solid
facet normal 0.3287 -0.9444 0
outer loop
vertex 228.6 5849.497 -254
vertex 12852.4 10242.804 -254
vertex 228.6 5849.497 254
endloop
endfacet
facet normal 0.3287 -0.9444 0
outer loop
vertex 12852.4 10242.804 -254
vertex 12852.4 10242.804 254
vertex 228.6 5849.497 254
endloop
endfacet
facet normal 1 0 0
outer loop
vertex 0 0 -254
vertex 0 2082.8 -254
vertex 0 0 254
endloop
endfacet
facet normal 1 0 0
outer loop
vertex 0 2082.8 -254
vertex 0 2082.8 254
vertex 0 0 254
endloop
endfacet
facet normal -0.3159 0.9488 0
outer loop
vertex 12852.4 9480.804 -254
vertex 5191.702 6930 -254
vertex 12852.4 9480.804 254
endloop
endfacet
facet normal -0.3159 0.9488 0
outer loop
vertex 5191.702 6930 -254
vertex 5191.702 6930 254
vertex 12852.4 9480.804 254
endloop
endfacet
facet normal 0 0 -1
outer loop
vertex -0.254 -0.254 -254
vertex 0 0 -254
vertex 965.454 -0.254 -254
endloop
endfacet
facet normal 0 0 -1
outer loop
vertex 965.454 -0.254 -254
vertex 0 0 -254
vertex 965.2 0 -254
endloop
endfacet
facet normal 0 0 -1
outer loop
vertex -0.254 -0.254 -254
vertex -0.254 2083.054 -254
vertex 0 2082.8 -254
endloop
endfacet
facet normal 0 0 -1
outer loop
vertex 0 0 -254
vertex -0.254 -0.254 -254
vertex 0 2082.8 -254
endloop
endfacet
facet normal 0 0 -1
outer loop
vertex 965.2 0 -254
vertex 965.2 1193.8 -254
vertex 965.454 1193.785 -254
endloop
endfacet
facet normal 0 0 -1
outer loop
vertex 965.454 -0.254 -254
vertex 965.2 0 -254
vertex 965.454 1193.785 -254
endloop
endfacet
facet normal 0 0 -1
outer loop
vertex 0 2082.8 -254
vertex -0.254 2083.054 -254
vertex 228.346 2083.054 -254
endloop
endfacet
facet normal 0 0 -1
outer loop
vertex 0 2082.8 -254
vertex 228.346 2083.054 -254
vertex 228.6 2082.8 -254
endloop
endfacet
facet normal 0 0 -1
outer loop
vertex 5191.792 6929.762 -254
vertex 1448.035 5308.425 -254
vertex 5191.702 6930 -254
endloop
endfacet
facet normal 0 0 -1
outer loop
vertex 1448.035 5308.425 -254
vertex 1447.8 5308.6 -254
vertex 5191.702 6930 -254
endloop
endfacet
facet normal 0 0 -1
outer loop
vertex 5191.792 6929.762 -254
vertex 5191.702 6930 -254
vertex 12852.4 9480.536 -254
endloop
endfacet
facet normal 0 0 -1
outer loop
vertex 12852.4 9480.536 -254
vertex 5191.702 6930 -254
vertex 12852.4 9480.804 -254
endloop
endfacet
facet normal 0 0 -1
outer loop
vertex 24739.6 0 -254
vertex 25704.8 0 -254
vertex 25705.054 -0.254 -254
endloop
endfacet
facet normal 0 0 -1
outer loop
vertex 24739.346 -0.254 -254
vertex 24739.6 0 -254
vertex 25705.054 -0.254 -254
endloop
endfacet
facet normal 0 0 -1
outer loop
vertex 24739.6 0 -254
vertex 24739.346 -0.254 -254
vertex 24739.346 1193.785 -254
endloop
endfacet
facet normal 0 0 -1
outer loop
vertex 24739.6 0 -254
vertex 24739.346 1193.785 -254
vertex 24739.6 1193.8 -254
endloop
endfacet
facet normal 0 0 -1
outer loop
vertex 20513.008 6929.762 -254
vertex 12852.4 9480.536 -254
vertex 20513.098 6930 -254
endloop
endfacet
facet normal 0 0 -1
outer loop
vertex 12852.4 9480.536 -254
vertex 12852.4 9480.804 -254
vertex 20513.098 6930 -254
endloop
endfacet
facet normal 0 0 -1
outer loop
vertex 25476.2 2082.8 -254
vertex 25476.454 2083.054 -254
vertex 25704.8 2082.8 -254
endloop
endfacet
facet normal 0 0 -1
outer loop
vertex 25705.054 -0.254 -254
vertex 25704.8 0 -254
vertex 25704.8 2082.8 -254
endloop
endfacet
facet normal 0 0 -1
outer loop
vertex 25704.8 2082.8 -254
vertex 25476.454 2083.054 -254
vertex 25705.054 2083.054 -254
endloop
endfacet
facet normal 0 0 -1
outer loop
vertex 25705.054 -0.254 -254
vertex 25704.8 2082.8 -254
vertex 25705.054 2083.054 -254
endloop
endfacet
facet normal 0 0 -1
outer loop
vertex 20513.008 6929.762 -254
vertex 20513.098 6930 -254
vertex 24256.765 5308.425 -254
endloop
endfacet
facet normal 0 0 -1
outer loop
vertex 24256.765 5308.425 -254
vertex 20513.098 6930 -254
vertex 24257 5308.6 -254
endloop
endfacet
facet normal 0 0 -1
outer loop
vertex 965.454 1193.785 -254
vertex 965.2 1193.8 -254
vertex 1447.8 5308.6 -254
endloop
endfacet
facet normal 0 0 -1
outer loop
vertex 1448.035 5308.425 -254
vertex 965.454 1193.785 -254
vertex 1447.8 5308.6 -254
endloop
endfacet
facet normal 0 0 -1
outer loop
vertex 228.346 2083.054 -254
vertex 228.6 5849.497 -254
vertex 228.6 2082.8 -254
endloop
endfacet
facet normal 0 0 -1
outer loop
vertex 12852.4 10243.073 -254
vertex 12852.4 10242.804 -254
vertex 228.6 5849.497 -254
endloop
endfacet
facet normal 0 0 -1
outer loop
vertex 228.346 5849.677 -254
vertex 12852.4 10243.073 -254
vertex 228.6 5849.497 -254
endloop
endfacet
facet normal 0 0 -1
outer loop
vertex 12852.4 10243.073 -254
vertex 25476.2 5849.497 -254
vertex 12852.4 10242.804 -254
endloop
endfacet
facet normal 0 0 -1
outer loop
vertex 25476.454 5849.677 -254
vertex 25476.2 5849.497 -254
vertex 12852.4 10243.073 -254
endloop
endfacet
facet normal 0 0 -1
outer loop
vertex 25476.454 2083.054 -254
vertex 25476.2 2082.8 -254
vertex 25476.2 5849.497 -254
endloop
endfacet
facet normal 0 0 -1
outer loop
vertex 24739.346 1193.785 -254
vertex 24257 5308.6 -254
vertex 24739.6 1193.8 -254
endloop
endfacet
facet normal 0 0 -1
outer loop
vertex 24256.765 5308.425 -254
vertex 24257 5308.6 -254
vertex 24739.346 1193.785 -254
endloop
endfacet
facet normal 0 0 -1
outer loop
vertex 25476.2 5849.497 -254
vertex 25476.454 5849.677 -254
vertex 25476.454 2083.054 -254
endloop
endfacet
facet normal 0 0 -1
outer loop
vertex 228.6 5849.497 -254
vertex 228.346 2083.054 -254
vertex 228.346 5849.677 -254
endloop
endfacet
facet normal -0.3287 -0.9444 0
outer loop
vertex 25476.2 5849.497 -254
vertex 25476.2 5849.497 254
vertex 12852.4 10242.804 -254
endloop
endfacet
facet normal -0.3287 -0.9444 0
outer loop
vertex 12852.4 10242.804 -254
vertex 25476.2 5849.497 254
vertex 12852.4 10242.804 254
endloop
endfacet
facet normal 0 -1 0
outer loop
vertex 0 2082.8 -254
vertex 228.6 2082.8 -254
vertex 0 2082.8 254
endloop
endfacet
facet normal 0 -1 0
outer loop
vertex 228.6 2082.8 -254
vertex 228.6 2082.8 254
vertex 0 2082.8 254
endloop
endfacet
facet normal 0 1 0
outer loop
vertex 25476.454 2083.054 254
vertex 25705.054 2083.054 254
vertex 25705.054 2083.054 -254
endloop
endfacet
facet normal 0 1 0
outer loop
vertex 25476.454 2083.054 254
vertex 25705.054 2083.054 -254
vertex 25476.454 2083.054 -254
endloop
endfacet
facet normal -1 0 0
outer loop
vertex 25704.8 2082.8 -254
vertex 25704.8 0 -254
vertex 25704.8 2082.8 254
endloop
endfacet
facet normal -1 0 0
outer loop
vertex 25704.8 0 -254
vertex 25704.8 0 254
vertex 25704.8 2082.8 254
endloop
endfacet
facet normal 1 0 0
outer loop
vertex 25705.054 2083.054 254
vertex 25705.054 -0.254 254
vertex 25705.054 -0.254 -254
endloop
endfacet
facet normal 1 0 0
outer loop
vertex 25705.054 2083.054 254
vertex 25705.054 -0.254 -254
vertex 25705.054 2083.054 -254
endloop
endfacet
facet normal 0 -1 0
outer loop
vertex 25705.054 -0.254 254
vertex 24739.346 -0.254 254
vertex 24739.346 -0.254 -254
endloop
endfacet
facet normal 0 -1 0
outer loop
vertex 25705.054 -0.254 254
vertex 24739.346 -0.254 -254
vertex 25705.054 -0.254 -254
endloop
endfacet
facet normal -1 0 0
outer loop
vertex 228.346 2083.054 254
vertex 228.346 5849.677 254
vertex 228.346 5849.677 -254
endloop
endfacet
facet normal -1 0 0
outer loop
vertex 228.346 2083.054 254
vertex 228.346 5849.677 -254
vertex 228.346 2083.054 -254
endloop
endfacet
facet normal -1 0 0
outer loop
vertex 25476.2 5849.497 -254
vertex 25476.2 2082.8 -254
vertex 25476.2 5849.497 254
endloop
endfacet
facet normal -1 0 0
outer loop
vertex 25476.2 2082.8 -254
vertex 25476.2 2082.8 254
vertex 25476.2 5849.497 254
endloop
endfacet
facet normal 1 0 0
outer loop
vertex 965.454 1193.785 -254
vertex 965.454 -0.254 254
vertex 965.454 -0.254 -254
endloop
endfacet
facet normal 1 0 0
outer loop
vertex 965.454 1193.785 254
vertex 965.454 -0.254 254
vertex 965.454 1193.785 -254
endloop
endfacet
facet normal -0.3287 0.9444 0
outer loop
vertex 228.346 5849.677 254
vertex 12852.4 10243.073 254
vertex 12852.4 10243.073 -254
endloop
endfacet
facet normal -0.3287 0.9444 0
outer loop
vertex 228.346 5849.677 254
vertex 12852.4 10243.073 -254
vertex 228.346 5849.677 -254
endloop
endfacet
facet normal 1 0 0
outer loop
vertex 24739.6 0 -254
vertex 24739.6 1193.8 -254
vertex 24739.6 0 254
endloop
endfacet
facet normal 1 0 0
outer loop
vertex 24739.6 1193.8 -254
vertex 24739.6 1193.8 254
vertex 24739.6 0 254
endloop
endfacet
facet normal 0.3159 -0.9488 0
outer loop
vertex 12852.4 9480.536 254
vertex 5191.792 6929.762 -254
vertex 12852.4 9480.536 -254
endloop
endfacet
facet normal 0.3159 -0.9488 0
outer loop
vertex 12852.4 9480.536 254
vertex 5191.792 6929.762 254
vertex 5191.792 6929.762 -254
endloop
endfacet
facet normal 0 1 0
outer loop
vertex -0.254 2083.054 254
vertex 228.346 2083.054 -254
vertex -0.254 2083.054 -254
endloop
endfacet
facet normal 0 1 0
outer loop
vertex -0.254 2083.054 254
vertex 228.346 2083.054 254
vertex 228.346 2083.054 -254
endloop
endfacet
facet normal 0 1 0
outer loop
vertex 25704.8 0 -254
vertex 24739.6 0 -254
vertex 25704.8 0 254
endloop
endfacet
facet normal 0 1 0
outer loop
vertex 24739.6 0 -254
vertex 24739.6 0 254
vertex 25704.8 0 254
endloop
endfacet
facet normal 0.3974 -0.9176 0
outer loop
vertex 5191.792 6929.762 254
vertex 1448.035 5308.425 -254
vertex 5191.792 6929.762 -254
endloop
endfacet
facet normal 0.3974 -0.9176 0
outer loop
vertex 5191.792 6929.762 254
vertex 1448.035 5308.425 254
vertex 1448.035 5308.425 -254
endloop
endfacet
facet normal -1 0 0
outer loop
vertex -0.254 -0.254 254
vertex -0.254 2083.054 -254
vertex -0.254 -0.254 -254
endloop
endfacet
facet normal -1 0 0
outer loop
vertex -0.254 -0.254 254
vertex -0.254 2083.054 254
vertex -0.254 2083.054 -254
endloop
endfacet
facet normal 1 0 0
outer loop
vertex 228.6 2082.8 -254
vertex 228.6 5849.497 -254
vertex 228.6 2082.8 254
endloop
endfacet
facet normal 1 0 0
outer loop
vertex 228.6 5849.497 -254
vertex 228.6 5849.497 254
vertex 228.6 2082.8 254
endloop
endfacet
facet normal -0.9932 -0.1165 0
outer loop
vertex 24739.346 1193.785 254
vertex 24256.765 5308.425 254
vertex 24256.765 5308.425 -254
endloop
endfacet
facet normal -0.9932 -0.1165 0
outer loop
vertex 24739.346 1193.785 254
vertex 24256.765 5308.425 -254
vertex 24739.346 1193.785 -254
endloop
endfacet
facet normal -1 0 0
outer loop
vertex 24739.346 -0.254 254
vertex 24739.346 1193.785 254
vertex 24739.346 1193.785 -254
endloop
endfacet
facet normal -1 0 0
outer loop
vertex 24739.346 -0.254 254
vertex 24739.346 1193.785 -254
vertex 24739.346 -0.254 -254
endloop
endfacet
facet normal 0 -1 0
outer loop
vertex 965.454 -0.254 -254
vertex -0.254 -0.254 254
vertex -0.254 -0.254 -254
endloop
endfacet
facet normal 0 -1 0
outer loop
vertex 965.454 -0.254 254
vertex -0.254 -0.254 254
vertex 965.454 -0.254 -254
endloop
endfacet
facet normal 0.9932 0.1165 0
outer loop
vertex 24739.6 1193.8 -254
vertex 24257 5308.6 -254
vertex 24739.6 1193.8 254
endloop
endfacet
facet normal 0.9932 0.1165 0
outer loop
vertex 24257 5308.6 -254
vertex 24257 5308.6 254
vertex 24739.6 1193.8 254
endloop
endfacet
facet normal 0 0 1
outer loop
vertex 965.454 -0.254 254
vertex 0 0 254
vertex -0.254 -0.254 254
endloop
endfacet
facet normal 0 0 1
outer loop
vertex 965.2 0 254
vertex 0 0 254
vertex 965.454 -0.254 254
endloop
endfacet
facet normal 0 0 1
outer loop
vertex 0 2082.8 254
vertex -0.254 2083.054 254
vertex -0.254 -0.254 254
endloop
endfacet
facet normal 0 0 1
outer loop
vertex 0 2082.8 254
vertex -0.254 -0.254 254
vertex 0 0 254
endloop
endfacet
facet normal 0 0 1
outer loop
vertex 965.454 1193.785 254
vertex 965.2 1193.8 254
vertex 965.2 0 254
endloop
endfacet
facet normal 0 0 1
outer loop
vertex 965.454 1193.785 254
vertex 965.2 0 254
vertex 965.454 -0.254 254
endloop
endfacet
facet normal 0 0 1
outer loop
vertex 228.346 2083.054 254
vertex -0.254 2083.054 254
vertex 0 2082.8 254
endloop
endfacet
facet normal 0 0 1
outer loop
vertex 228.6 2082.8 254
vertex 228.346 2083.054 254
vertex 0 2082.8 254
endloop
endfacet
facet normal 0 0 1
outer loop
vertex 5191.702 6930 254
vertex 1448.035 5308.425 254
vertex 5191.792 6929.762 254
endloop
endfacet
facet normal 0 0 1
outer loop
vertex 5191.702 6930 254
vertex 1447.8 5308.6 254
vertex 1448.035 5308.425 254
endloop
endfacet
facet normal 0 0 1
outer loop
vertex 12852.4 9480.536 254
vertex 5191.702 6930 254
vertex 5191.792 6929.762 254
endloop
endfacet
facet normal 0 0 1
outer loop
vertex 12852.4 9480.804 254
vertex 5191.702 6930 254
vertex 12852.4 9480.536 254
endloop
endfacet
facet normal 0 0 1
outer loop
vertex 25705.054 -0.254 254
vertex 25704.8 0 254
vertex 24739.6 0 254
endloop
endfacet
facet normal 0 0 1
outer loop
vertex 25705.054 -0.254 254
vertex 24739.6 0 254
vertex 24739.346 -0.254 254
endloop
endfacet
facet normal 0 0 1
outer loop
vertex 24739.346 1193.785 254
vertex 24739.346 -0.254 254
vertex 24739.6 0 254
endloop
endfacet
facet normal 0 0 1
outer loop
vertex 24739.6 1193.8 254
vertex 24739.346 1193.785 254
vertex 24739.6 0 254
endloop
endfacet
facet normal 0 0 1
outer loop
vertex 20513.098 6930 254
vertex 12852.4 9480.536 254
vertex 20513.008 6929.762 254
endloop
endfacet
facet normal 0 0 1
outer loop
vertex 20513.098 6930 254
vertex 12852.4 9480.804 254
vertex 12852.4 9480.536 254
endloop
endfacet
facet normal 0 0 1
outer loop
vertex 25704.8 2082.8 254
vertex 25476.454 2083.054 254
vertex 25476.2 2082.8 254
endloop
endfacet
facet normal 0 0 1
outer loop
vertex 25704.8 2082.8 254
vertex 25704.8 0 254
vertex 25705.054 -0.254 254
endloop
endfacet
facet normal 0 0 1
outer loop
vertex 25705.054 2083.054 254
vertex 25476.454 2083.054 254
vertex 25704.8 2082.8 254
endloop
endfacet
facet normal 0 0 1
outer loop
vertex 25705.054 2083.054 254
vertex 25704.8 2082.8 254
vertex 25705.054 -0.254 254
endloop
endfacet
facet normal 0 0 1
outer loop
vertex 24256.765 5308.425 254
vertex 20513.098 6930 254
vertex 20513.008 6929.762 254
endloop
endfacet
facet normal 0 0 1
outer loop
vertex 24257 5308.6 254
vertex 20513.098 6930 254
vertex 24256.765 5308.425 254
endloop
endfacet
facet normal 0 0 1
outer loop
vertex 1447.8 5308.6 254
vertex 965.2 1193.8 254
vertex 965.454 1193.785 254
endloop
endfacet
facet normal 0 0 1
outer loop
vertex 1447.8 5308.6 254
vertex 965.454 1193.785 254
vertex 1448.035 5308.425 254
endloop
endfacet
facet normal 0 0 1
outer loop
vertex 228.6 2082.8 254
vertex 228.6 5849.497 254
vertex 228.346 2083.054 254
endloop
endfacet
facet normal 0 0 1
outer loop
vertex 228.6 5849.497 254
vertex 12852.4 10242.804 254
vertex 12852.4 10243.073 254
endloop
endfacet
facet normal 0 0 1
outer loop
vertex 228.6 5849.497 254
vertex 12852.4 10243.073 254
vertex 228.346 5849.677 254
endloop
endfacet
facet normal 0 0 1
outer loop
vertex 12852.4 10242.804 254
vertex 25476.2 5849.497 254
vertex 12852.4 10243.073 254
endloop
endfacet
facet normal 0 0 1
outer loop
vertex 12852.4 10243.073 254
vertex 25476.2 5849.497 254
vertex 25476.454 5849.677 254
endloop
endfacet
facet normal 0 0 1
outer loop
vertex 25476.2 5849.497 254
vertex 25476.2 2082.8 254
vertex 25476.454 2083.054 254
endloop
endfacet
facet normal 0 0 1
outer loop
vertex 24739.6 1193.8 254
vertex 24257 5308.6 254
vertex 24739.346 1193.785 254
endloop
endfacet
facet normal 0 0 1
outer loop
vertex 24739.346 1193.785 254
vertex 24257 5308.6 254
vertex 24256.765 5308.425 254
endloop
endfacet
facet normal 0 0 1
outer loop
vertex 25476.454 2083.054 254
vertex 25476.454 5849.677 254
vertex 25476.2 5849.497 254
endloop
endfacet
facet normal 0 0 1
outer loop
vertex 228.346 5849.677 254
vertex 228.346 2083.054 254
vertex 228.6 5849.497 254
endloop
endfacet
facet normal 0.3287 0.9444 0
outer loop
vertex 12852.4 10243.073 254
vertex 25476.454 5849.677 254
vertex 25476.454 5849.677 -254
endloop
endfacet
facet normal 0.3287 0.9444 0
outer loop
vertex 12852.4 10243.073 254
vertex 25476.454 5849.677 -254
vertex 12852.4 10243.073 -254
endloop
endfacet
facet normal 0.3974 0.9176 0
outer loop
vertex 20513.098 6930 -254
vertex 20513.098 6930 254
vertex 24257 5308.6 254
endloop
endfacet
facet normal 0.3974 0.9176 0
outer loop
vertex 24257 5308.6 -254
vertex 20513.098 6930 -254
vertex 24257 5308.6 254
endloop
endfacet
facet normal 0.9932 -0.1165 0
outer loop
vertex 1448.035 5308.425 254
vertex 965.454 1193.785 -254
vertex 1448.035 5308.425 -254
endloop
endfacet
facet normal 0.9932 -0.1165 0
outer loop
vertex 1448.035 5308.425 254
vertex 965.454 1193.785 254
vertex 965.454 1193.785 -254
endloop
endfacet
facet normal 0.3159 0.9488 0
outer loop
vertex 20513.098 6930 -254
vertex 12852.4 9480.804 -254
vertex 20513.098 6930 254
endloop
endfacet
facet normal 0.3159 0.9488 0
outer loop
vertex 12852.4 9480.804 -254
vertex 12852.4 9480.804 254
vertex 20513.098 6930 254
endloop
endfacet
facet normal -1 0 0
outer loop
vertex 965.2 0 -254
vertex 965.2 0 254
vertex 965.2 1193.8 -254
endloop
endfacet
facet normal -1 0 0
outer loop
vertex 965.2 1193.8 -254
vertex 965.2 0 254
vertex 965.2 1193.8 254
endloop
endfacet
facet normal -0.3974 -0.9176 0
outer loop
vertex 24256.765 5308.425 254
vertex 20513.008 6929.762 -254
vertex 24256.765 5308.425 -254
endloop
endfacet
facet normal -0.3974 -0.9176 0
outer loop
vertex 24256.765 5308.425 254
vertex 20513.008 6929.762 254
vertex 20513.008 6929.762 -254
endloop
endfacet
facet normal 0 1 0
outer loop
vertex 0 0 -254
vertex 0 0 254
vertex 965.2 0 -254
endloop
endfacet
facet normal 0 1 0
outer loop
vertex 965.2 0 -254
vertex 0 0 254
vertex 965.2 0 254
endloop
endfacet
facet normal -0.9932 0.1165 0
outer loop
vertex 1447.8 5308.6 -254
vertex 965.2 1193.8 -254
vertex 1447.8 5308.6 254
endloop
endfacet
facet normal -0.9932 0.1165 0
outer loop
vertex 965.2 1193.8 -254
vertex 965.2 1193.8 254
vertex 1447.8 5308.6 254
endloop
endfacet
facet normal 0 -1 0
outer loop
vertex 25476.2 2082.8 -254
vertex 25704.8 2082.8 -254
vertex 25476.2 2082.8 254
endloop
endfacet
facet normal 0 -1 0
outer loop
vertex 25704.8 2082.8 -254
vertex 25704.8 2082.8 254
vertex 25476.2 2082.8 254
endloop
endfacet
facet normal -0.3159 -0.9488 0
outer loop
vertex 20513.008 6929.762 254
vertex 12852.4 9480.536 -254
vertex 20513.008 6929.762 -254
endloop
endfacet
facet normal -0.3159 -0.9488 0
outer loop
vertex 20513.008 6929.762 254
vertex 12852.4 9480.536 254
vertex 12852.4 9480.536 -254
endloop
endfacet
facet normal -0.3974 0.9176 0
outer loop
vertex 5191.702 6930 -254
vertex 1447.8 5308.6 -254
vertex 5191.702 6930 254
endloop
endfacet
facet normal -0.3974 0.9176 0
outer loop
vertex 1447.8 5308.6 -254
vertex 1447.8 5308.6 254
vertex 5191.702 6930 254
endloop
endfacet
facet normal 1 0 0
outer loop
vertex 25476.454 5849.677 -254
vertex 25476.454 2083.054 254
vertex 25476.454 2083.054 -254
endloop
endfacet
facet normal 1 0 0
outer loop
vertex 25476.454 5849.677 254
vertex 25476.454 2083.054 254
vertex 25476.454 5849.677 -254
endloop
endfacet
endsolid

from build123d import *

# Parameters (mm, degrees)
EXTRUIR_L_MINA1_DEPTH = 254


with BuildPart() as part:
    # Croquis1 → Extruir-Lámina1 (new body, symmetric)
    with BuildSketch(Plane.XY):
        Polygon((20513.007562206, 6929.762411967), (24256.764775023, 5308.425074033), (24739.346, 1193.785155811), (24739.346, -0.254), (25705.054, -0.254), (25705.054, 2083.054), (25476.454, 2083.054), (25476.454, 5849.677222807), (12852.4, 10243.072942272), (228.346, 5849.677222807), (228.346, 2083.054), (-0.254, 2083.054), (-0.254, -0.254), (965.454, -0.254), (965.454, 1193.785155811), (1448.035224977, 5308.425074033), (5191.792437794, 6929.762411967), (12852.4, 9480.536289437), align=None)
        Polygon((20513.098327776, 6929.999900065), (24257, 5308.6), (24739.6, 1193.8), (24739.6, 0), (25704.8, 0), (25704.8, 2082.8), (25476.2, 2082.8), (25476.2, 5849.49667706), (12852.4, 10242.804), (228.6, 5849.49667706), (228.6, 2082.8), (0, 2082.8), (0, 0), (965.2, 0), (965.2, 1193.8), (1447.8, 5308.6), (5191.701672224, 6929.999900065), (12852.4, 9480.804), align=None, mode=Mode.SUBTRACT)
    extrude(amount=EXTRUIR_L_MINA1_DEPTH, both=True)


solid = part.part
